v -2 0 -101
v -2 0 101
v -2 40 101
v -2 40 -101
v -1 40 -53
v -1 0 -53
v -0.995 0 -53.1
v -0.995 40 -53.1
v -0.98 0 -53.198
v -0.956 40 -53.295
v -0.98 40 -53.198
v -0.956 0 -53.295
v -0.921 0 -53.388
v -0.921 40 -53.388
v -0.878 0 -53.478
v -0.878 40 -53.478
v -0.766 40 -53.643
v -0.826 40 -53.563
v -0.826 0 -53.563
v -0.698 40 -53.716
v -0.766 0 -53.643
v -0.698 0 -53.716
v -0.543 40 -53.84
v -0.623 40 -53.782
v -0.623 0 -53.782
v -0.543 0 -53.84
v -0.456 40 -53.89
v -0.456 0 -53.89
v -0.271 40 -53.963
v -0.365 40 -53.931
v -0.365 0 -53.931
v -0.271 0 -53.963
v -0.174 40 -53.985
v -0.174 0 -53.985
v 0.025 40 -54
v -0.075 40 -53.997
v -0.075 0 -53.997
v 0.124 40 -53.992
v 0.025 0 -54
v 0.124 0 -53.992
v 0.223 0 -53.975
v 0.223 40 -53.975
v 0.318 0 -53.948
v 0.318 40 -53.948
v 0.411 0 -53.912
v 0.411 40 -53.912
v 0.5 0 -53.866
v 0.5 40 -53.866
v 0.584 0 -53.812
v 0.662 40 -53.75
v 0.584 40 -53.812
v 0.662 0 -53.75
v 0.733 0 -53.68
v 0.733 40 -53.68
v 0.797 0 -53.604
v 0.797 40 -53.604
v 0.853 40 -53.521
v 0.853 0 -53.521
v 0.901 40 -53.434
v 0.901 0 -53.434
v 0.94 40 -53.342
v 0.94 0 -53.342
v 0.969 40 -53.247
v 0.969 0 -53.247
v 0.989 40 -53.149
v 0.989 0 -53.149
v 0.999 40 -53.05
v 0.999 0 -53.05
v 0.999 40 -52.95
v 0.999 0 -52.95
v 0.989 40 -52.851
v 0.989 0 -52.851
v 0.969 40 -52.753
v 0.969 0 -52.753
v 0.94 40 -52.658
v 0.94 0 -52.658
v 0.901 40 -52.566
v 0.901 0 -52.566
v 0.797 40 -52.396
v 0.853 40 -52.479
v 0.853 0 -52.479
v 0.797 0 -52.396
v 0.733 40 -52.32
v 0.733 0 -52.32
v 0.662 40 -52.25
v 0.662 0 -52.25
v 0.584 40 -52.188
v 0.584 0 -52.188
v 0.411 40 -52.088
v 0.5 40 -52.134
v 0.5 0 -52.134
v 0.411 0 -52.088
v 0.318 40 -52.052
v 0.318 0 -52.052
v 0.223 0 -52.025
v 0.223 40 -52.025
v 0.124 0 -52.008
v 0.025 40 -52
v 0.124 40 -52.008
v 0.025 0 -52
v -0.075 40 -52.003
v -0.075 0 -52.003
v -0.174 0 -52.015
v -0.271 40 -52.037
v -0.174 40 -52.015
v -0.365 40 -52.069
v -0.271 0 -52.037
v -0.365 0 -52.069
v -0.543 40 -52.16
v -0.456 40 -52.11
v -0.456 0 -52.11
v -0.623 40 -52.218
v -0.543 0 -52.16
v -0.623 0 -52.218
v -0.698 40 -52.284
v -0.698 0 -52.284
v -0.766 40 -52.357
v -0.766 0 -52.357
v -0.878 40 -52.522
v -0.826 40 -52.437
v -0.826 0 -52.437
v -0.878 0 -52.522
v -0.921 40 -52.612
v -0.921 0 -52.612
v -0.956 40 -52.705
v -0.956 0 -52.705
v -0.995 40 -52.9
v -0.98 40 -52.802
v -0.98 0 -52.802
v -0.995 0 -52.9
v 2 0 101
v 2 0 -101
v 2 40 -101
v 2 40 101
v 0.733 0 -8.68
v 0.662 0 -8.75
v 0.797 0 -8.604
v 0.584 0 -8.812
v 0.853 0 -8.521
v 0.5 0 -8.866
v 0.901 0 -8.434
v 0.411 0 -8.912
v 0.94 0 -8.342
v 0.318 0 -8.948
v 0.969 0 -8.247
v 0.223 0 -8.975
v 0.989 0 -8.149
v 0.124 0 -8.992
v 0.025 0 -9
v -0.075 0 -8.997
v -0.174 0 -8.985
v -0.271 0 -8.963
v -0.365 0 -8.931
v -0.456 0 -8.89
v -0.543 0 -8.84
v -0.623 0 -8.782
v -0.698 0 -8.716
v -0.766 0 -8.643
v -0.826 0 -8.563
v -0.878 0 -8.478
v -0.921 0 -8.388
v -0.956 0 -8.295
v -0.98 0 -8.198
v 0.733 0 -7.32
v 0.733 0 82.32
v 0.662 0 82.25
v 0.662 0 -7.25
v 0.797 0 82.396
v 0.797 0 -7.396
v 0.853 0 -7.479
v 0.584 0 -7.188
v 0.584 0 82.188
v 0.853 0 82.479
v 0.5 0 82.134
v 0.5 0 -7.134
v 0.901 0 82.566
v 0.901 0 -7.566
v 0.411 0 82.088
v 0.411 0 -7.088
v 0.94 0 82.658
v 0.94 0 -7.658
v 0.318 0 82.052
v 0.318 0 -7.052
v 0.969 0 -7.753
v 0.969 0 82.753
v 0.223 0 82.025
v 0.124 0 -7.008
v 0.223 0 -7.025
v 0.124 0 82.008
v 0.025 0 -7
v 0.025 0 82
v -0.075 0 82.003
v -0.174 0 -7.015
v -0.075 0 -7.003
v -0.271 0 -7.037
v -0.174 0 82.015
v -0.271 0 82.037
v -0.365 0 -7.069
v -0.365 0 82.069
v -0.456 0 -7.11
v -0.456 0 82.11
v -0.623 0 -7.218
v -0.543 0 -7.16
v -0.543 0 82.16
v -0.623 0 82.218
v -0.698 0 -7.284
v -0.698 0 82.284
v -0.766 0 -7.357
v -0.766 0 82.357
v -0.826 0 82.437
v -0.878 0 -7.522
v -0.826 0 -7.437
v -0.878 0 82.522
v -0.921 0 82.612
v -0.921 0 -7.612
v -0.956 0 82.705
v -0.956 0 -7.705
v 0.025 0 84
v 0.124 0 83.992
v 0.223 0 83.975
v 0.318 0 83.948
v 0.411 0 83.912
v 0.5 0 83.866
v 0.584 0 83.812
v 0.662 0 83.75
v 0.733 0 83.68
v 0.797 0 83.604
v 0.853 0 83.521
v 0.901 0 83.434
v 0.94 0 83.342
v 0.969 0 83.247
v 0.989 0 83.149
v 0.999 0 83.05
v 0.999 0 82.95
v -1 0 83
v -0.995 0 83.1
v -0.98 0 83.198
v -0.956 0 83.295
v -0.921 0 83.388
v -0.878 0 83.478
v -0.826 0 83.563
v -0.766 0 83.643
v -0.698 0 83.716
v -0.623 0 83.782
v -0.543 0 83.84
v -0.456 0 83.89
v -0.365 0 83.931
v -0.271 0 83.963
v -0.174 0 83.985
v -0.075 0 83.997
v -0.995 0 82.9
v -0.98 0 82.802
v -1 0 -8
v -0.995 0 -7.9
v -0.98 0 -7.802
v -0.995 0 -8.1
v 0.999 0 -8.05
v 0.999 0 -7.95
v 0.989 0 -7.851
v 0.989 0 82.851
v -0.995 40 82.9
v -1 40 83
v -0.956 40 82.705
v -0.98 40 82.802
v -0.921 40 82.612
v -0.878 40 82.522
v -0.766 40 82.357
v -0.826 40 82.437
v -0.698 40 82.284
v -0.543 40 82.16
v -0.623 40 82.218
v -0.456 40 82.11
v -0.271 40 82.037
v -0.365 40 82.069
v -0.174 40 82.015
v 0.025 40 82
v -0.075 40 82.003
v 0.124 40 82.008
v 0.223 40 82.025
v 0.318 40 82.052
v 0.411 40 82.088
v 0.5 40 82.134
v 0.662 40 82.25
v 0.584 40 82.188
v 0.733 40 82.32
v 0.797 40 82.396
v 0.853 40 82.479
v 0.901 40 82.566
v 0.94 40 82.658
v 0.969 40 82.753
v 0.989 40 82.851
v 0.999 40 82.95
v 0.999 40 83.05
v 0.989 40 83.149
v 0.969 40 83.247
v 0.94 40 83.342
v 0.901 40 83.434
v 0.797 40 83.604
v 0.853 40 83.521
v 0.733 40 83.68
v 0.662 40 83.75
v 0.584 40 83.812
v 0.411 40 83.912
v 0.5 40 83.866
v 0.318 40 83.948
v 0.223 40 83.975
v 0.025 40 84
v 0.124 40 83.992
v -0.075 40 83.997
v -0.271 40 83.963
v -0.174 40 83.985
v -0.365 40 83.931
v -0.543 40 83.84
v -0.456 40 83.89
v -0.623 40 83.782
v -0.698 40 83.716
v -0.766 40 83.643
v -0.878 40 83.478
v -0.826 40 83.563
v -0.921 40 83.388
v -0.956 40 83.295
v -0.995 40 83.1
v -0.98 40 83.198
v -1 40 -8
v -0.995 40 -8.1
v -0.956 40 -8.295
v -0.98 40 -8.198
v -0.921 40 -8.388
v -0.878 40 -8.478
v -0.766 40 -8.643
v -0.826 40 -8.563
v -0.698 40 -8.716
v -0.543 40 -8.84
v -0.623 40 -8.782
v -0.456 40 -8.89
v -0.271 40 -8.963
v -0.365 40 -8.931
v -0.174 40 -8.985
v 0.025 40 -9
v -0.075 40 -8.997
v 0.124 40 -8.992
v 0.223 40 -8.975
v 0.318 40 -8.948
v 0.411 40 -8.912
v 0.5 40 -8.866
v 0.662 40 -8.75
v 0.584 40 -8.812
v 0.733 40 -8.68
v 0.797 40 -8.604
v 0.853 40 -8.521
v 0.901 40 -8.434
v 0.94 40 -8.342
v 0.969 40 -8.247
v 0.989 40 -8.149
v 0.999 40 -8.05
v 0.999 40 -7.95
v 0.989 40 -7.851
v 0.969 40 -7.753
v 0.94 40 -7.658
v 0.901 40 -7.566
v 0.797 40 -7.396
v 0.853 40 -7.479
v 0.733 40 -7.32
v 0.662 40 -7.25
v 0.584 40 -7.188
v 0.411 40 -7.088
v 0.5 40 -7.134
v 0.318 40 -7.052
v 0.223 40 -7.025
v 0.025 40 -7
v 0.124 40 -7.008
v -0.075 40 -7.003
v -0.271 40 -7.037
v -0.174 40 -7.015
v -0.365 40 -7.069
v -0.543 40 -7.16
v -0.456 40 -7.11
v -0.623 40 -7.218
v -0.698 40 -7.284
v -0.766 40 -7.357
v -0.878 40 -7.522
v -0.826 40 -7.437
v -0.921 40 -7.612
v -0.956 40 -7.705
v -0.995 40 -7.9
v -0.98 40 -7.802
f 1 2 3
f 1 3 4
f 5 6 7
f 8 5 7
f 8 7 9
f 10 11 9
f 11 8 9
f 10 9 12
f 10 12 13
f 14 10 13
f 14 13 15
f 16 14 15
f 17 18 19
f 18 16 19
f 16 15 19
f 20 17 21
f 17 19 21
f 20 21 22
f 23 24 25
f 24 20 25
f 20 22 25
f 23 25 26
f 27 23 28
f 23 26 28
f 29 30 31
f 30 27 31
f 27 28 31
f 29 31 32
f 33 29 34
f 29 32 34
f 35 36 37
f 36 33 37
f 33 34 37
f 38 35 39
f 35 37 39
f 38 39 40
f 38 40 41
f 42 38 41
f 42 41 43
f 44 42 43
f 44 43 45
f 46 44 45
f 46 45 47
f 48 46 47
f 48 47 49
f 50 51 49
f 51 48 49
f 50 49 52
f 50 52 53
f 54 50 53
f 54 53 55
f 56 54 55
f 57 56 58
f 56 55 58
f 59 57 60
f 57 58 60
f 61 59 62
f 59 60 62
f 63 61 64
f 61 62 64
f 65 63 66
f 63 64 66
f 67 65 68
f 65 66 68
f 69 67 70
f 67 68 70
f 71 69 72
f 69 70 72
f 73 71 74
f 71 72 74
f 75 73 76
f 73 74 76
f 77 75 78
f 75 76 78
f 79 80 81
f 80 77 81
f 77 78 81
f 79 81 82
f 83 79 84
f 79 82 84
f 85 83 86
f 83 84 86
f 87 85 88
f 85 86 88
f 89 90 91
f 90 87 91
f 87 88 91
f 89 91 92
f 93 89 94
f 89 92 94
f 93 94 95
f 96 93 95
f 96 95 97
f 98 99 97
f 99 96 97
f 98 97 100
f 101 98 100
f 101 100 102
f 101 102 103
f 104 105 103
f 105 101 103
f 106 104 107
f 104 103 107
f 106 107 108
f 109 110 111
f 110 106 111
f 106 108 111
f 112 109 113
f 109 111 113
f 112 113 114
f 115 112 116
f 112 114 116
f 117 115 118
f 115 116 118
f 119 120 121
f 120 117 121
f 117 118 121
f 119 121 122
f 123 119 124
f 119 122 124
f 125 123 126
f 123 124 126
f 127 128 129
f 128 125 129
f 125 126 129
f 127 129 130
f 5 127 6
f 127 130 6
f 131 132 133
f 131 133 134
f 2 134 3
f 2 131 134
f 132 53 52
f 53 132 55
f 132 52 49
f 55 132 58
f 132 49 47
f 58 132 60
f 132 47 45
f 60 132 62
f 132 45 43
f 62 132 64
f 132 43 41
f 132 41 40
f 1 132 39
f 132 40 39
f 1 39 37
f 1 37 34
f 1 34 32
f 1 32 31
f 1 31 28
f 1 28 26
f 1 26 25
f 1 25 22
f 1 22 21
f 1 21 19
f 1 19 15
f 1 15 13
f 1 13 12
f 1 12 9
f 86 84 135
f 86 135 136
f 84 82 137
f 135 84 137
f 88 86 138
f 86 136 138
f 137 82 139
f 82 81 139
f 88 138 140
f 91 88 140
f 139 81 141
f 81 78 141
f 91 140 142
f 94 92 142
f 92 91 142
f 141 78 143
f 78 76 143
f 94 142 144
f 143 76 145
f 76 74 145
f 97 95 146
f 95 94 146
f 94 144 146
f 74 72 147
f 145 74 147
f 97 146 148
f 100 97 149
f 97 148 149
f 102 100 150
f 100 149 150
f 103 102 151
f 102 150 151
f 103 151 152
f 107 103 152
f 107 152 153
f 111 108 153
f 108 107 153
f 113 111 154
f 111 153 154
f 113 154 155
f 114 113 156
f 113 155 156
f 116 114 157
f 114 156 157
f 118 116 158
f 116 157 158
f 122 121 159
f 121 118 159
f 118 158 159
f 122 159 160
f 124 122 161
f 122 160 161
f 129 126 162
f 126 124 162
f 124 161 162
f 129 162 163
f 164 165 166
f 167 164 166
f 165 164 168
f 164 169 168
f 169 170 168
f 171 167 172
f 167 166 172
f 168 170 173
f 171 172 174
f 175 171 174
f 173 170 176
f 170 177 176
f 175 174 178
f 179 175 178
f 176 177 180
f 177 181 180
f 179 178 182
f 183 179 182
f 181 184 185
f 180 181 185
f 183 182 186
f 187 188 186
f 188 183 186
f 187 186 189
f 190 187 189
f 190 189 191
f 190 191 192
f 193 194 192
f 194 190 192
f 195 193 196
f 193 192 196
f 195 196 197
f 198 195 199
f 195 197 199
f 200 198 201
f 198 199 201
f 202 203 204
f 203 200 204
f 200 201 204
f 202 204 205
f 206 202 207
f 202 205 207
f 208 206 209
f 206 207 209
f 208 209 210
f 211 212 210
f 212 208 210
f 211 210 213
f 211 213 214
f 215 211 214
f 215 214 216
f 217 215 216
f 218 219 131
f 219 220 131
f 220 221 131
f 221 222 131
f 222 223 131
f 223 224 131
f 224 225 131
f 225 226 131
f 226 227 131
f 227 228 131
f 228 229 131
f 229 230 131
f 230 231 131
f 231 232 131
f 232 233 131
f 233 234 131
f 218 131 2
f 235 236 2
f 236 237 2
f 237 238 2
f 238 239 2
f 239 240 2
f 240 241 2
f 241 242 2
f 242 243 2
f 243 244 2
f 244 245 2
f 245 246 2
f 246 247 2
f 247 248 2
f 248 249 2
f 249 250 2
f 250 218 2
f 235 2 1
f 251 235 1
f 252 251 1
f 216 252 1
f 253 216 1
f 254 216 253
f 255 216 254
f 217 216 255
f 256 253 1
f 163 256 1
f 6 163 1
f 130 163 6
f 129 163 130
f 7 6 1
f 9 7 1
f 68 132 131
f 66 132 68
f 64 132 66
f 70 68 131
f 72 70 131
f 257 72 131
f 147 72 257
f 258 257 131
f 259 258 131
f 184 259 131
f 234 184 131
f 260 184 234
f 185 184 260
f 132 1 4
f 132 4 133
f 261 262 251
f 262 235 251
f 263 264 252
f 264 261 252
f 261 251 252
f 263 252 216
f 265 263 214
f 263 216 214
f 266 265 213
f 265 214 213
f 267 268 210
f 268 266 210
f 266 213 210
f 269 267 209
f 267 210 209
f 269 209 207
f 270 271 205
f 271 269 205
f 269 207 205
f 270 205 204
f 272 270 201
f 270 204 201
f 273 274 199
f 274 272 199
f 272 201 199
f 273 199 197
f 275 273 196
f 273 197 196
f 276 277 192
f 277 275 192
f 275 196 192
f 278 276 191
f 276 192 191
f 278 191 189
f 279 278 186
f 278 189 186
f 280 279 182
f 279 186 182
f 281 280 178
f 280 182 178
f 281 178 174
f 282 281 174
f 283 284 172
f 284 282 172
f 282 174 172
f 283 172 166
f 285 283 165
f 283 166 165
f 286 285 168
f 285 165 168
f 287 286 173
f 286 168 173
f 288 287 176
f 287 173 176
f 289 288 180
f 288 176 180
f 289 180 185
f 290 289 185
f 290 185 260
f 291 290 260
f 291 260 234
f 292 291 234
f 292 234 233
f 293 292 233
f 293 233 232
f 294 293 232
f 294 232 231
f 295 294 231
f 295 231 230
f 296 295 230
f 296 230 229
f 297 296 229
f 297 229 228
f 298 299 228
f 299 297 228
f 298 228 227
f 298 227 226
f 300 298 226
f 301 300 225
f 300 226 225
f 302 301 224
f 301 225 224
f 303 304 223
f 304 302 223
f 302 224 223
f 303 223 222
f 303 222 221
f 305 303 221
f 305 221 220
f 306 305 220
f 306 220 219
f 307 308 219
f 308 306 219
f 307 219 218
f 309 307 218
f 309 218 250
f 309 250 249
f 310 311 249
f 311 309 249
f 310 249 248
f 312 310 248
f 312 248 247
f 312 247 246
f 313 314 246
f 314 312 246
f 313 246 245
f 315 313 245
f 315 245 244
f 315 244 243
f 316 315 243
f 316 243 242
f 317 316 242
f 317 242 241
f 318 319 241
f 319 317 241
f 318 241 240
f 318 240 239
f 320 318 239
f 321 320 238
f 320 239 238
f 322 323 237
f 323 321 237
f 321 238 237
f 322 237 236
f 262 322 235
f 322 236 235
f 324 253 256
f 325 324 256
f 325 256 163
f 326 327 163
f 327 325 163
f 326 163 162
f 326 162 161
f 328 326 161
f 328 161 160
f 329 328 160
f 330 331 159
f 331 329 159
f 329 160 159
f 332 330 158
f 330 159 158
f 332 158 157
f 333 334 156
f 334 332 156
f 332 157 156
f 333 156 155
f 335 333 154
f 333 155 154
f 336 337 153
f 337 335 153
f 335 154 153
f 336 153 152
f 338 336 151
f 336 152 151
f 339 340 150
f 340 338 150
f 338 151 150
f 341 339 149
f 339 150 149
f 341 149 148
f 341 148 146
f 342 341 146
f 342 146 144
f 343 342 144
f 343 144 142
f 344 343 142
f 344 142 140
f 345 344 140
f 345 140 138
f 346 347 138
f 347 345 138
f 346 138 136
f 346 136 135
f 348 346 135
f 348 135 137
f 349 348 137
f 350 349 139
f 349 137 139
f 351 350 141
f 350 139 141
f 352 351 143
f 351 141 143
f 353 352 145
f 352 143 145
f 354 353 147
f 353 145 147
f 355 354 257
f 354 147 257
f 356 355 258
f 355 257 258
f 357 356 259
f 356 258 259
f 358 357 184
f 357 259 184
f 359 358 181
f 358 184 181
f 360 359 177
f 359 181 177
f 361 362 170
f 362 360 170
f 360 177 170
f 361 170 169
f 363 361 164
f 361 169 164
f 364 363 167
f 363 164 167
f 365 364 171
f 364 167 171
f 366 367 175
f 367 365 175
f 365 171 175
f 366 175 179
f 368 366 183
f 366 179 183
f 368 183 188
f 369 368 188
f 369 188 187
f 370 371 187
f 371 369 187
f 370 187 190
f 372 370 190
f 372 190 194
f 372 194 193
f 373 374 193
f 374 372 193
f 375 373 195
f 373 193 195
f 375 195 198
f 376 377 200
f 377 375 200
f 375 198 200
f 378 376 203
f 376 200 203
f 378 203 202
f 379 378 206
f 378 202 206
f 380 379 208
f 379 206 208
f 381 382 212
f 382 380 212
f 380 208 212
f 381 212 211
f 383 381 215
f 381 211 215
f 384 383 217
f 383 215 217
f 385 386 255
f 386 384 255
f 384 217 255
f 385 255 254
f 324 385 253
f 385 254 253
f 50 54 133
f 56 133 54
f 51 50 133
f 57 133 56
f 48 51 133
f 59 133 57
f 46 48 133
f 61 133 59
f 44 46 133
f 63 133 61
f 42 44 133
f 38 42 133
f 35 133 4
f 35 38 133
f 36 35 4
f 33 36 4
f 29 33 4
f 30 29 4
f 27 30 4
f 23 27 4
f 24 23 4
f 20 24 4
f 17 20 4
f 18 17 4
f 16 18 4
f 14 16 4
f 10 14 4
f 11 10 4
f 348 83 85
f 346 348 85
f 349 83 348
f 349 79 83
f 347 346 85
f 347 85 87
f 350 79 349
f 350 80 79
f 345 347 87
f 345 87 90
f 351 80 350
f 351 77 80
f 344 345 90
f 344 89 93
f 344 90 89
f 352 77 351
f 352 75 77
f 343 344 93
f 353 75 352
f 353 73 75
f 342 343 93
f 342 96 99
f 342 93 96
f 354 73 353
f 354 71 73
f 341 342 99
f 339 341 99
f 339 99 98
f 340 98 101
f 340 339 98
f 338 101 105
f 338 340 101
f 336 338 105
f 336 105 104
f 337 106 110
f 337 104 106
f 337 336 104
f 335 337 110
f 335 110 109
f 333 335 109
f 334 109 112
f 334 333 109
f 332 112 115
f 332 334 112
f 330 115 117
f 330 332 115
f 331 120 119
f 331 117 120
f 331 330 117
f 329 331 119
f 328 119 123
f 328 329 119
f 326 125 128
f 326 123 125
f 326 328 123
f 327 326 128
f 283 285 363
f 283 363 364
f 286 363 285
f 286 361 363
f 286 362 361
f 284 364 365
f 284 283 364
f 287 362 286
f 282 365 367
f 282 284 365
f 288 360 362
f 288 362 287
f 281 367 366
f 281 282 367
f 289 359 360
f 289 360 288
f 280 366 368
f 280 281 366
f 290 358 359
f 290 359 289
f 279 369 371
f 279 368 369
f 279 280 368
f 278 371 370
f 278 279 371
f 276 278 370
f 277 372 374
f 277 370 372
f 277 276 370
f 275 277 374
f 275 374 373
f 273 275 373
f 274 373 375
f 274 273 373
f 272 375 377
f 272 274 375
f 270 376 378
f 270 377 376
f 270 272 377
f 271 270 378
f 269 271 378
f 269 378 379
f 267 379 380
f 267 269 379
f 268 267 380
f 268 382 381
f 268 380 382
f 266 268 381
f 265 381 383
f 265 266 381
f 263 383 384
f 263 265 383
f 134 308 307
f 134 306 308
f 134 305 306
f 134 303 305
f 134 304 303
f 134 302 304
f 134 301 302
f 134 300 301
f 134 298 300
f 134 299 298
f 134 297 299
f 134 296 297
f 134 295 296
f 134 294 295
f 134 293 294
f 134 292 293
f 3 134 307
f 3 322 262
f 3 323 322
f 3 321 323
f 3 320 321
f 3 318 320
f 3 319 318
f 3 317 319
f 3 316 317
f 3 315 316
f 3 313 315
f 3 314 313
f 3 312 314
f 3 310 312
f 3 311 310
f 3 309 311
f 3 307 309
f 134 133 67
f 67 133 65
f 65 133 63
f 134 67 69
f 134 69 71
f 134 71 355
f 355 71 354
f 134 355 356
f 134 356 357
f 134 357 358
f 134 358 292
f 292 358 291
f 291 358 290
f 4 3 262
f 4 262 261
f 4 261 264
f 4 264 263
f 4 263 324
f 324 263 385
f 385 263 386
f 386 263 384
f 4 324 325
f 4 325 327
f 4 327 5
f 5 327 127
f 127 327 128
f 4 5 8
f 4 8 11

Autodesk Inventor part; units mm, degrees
ref_plane "YZ Plane" through (0, 0, 0) normal (1, 0, 0) x (0, 1, 0)
ref_plane "XZ Plane" through (0, 0, 0) normal (0, 1, 0) x (-1, 0, 0)
ref_plane "XY Plane" through (0, 0, 0) normal (0, 0, 1) x (1, 0, 0)
sketch "Sketch1" plane through (0, 0, 0) normal (0, 1, 0) x (-1, 0, 0)
  line L0 (2, -101) -> (-2, -101)
  line L1 (-2, -101) -> (-2, 101)
  line L2 (-2, 101) -> (2, 101)
  line L3 (2, 101) -> (2, -101)
  line L4 (2, -101) -> (-2, 101) construction
  line L5 (-2, -101) -> (2, 101) construction
  circle A0 centre (0, 83) radius 1
  circle A1 centre (0, -53) radius 1
  circle A2 centre (0, -8) radius 1
  point P0 (0, 0)
  dimension "d0" = 4
  dimension "d1" = 202
  dimension "d2" = 2
  dimension "d3" = 18
  dimension "d4" = 2
  dimension "d5" = 2
  dimension "d6" = 48
  dimension "d7" = 2
  dimension "d8" = 2
  dimension "d9" = 2
  dimension "d10" = 93
extrude "Extrusion1" add sketch "Sketch1" along normal blind 40
properties part number "DindingRobotKananKiri"
